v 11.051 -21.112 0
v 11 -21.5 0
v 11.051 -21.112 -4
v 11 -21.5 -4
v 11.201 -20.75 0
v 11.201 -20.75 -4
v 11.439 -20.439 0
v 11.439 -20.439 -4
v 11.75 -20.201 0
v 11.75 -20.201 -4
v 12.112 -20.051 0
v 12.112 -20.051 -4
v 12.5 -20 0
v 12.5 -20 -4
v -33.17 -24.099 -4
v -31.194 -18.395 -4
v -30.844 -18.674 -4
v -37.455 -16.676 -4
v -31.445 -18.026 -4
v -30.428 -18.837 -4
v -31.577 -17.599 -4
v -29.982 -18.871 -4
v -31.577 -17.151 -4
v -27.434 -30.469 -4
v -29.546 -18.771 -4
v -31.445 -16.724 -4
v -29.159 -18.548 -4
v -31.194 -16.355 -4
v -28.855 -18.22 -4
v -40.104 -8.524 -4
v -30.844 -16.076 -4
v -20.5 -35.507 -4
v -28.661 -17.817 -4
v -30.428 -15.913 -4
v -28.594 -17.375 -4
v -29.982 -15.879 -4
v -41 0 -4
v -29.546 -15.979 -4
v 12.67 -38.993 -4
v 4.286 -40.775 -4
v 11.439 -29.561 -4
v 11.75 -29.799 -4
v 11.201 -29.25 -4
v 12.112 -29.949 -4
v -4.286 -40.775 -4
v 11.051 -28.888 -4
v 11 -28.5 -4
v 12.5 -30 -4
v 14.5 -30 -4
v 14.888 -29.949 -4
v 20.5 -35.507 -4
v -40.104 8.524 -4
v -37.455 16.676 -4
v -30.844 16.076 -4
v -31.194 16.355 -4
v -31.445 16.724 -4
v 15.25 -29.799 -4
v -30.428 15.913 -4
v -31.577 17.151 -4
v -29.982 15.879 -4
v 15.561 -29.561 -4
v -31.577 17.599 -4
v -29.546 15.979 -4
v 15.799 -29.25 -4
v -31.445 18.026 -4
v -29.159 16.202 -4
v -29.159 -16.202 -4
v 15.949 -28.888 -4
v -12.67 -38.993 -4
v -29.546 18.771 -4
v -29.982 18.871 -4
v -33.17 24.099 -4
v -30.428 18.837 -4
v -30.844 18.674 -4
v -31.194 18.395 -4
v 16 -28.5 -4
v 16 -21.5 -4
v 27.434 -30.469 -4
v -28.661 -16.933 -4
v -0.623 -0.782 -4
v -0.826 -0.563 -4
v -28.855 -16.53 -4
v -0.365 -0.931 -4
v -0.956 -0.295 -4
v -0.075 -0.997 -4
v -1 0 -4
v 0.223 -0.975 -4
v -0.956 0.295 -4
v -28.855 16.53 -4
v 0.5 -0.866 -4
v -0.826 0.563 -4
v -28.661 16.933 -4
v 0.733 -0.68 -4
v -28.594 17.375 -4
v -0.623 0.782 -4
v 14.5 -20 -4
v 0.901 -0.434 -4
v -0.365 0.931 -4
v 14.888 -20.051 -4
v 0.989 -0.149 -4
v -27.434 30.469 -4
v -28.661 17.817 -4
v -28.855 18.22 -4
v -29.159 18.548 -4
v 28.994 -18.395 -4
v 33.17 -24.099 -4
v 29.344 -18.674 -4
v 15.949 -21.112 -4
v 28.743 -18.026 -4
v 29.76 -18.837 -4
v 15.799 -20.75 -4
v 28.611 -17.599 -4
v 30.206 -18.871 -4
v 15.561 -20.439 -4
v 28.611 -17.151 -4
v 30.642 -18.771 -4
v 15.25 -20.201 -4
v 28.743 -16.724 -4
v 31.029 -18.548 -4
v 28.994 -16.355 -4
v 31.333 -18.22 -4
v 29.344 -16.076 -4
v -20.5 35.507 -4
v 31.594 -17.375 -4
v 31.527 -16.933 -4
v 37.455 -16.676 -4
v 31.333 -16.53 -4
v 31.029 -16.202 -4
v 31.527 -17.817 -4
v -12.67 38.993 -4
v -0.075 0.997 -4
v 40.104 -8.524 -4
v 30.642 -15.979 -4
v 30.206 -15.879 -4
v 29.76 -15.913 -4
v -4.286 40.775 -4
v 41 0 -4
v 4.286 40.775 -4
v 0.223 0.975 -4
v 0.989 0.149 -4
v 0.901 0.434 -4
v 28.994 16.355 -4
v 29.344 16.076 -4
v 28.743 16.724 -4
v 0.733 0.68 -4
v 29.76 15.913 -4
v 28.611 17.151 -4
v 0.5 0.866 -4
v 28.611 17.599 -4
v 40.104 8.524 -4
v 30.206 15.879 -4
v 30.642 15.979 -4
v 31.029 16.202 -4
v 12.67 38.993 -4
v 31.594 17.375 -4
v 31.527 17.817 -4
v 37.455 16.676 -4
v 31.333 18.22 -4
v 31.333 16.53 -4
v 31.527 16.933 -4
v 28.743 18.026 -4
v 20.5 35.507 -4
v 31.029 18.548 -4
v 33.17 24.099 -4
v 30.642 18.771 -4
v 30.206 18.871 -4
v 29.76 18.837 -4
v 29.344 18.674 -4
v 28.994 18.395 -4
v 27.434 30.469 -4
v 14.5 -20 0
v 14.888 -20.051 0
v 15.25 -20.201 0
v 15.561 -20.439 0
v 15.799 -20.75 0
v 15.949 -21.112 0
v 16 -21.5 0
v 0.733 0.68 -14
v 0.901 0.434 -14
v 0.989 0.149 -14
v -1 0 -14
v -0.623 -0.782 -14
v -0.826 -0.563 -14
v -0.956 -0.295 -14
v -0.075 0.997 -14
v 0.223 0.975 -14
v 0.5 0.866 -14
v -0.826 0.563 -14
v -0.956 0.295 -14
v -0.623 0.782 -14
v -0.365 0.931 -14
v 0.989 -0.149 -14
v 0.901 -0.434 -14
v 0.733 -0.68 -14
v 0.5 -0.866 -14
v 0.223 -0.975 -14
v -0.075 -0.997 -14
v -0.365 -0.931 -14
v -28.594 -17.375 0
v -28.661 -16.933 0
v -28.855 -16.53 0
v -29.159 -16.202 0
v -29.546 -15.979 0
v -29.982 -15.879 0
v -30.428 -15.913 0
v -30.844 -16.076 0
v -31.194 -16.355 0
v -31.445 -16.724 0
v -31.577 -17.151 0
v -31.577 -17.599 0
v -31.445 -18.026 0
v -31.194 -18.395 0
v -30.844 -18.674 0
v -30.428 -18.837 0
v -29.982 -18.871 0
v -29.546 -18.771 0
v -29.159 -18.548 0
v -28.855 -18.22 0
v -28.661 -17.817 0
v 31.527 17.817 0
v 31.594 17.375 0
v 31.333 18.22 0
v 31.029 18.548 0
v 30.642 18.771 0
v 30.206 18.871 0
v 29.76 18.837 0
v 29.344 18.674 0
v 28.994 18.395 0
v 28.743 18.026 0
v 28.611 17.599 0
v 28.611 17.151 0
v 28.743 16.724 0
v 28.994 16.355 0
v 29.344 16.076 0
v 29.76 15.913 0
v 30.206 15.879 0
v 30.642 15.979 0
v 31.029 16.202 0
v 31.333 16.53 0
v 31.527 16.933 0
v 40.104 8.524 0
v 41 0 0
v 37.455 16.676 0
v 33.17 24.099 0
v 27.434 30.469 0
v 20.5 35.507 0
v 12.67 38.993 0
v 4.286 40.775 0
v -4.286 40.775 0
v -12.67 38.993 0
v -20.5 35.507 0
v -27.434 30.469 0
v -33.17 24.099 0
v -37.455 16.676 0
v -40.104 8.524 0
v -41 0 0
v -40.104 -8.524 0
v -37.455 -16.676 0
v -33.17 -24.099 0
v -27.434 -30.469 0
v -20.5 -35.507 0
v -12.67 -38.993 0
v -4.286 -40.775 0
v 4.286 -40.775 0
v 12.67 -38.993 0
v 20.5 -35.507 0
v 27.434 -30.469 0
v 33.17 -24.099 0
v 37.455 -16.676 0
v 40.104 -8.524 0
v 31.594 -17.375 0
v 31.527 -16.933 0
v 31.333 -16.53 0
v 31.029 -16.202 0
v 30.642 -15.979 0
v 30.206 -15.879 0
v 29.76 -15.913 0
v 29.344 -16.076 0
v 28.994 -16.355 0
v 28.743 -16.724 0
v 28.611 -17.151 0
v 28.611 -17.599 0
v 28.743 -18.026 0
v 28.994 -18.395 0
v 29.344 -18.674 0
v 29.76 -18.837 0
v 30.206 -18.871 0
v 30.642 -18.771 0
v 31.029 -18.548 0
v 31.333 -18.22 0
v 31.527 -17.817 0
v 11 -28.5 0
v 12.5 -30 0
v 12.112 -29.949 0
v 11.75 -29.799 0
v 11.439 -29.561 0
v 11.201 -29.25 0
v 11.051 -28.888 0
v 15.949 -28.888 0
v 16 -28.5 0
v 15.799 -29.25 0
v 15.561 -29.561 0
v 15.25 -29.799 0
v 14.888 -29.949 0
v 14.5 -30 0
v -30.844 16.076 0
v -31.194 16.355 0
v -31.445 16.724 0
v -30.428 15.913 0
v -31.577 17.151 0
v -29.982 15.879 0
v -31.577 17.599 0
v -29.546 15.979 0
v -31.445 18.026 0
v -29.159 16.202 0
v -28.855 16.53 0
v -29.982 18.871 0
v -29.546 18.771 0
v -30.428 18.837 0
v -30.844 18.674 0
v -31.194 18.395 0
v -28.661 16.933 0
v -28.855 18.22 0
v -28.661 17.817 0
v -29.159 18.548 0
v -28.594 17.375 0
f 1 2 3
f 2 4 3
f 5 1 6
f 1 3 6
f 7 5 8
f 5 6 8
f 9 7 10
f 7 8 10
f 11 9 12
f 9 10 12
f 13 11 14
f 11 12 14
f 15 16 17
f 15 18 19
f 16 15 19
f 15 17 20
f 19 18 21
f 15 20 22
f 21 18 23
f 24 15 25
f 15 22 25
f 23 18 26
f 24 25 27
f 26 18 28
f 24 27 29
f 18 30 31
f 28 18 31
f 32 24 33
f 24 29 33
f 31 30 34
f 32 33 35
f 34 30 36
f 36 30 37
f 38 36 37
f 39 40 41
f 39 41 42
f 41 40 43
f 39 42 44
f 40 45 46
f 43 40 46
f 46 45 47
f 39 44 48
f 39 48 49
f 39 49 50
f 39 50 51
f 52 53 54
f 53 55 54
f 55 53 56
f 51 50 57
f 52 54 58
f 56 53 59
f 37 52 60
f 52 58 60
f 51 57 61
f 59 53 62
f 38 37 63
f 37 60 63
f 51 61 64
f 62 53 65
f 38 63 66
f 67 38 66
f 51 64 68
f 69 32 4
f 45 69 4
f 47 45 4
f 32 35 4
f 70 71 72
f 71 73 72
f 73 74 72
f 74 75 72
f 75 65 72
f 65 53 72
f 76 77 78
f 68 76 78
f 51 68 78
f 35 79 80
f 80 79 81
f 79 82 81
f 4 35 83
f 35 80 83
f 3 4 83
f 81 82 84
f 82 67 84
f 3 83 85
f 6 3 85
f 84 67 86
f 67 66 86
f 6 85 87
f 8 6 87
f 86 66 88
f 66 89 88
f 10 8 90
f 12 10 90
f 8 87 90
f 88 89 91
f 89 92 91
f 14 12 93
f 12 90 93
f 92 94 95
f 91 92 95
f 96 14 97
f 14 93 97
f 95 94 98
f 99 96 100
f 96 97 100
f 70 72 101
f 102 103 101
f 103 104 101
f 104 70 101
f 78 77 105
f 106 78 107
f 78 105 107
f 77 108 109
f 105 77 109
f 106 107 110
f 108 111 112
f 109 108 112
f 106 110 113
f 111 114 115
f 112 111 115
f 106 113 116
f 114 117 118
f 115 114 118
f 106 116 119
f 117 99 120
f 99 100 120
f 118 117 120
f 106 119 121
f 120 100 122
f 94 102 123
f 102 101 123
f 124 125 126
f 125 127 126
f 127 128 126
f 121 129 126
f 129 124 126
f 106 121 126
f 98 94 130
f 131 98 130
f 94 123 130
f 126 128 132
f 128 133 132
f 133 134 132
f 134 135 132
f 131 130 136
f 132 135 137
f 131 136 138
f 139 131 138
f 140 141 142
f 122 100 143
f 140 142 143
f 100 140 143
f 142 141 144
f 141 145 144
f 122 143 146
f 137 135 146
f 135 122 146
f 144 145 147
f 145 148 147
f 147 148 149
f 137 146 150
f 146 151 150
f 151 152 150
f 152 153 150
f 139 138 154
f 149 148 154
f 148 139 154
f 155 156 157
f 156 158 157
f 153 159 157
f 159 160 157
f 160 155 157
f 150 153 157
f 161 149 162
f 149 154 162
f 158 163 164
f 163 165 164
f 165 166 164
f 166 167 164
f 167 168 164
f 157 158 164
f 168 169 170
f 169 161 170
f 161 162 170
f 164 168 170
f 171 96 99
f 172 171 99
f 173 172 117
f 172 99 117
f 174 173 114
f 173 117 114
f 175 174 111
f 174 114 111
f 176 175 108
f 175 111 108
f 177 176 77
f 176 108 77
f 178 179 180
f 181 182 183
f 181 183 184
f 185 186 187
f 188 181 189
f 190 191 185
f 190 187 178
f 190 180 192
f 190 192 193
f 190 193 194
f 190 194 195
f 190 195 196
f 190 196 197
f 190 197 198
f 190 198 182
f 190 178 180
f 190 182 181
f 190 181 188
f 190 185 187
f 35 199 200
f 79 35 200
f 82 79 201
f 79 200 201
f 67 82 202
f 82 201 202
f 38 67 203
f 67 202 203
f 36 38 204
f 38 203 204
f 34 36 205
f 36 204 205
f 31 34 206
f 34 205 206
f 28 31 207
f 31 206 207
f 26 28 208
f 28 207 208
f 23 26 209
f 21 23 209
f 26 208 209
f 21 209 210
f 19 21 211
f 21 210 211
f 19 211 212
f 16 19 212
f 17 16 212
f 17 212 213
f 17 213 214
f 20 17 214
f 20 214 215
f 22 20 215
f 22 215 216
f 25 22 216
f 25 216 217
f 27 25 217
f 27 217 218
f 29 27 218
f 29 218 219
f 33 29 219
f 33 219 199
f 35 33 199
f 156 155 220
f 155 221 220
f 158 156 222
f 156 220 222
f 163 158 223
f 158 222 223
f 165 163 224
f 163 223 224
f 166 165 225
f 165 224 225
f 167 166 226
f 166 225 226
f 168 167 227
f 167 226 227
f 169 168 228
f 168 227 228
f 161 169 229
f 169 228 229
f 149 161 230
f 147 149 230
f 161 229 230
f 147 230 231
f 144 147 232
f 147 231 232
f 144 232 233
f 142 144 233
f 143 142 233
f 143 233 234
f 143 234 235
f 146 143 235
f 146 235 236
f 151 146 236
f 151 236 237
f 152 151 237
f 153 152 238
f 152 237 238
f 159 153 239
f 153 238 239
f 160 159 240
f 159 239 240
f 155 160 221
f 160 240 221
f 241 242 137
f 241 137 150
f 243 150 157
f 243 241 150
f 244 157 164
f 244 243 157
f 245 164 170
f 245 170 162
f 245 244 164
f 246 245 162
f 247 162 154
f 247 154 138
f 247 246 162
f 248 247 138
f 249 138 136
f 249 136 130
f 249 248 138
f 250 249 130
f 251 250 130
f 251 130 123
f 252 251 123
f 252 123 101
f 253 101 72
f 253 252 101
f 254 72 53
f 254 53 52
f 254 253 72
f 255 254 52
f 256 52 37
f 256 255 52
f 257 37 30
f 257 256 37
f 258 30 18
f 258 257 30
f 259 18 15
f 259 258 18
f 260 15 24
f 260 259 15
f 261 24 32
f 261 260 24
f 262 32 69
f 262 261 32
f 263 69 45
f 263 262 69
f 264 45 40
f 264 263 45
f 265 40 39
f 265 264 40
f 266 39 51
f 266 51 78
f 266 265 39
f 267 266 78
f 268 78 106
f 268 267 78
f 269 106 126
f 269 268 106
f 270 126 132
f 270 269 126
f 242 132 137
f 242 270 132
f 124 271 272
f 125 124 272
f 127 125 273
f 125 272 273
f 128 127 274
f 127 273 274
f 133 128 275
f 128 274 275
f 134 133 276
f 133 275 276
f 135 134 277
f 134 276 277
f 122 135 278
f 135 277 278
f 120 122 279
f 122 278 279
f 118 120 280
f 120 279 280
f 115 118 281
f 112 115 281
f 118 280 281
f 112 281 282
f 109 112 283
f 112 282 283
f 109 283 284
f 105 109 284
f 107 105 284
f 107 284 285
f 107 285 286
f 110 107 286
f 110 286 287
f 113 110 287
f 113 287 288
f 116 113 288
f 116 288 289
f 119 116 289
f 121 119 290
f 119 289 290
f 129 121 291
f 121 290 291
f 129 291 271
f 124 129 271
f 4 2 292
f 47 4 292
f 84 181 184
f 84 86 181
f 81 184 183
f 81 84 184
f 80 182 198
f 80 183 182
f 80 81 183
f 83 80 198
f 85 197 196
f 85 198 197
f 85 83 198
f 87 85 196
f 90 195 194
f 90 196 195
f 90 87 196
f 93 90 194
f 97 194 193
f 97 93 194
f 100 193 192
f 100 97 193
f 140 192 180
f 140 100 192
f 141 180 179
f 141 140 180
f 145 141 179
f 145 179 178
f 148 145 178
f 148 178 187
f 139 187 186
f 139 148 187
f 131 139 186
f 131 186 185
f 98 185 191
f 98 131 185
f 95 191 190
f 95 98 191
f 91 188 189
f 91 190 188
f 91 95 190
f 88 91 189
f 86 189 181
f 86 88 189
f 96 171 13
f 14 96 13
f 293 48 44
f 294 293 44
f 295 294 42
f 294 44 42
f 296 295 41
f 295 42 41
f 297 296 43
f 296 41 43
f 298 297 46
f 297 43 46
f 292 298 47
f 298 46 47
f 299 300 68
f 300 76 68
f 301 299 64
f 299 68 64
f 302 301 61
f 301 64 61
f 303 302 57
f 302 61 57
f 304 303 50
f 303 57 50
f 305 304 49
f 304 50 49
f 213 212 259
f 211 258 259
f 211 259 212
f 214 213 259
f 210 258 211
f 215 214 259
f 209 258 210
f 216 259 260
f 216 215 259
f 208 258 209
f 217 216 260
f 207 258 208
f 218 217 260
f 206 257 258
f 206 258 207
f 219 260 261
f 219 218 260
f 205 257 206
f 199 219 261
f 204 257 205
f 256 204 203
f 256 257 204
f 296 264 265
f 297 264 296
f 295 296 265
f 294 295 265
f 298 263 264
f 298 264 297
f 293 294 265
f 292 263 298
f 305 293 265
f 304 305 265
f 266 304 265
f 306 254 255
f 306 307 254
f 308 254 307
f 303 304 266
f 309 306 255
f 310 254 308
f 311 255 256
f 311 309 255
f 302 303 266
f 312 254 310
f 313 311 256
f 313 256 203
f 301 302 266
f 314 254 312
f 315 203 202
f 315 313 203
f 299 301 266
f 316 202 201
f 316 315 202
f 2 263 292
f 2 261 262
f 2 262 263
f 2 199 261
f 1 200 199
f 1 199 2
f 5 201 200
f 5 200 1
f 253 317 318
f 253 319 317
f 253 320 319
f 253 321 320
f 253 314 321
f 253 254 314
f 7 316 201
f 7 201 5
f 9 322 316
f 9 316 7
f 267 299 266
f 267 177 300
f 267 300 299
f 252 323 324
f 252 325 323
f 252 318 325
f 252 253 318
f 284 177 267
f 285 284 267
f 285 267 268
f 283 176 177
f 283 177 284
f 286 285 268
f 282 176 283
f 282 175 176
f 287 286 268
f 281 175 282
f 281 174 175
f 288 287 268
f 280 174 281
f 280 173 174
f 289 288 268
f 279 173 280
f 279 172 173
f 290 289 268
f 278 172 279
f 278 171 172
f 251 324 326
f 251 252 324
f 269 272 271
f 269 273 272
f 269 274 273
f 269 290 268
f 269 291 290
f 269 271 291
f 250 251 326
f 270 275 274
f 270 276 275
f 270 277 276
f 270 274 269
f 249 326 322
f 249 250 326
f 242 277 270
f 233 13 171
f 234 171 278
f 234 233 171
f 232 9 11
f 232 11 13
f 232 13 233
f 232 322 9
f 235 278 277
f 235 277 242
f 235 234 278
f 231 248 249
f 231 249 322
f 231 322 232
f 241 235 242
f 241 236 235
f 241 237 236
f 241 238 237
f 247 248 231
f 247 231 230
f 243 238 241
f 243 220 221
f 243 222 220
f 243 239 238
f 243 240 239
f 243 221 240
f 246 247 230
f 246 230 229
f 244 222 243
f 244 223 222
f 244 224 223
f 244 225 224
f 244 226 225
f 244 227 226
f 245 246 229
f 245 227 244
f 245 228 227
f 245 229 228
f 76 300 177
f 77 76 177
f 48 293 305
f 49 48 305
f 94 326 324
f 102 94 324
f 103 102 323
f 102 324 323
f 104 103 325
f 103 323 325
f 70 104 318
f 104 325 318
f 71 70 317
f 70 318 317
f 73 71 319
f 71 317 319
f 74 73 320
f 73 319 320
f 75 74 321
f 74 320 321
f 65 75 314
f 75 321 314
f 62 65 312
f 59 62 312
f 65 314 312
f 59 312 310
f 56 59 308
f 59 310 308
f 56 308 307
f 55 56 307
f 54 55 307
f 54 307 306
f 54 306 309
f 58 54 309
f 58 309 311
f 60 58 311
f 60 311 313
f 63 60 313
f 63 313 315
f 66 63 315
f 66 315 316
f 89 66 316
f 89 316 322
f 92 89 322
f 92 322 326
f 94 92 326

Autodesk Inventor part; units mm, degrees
ref_plane "YZ Plane" through (0, 0, 0) normal (1, 0, 0) x (0, 1, 0)
sketch "Sketch1" plane through (0, 0, 0) normal (0, 0, 1) x (1, 0, 0)
  circle A0 centre (0, 0) radius 41
  circle A1 centre (0, 0) radius 17.705
  circle A2 centre (0, 0) radius 15
  circle A3 centre (0, 15) radius 0.75
  circle A4 centre (-10.6066, 10.6066) radius 0.75
  circle A5 centre (-15, 0) radius 0.75
  circle A6 centre (-10.6066, -10.6066) radius 0.75
  circle A7 centre (0, -15) radius 0.75
  circle A8 centre (10.6066, -10.6066) radius 0.75
  circle A9 centre (15, 0) radius 0.75
  circle A10 centre (10.6066, 10.6066) radius 0.75
  dimension "d4" = 30
  dimension "d0" = 82
  dimension "d3" = 35.41
  dimension "d5" = 1.5
  dimension "d6" = 360
sketch "Sketch2" plane through (0, 0, 0) normal (0, 0, 1) x (1, 0, 0)
  circle A0 centre (-30.094, -17.375) radius 1.5
  circle A1 centre (-30.094, 17.375) radius 1.5
  circle A2 centre (30.094, 17.375) radius 1.5
  circle A3 centre (30.094, -17.375) radius 1.5
  point P0 (0, 0)
  dimension "d7" = 3
  dimension "d8" = 3
  dimension "d9" = 3
  dimension "d10" = 3
  dimension "d11" = 17.375
  dimension "d12" = 30.094
  dimension "d13" = 30.094
  dimension "d14" = 17.375
  dimension "d15" = 17.375
  dimension "d16" = 30.094
  dimension "d17" = 17.375
  dimension "d18" = 30.094
extrude "Extrusion1" add sketch "Sketch1" against normal blind 4 contours A0 | A1 | A2 A9 | A2 A9 | A9 A2 A8 A7 A6 A5 A4 A3 A10 | A10 A2 | A2 A10 | A8 A2 | A2 A8 | A3 A2 | A2 A3 | A7 A2 | A2 A7 | A4 A2 | A2 A4 | A6 A2 | A2 A6 | A5 A2 | A2 A5
extrude "Extrusion2" cut sketch "Sketch2" against normal blind 4
ref_plane "Work Plane1" through (0, 0, -4) normal (0, 0, 1) x (1, 0, 0)
ref_plane "Work Plane2" through (0, 0, -4) normal (0, 0, 1) x (1, 0, 0)
ref_plane "Work Plane3" through (0, 0, 0) normal (0, 0, 1) x (1, 0, 0)
sketch "Sketch5" plane through (0, 0, 0) normal (0, 0, 1) x (1, 0, 0)
  line L0 (11, -30) -> (16, -30)
  line L1 (16, -30) -> (16, -20)
  line L2 (16, -20) -> (11, -20)
  line L3 (11, -20) -> (11, -30)
  point P0 (0, 0)
  point P1 (13.5, -20)
  point P2 (13.5, -30)
  point P3 (16, -25)
  dimension "d44" = 5
  dimension "d45" = 10
  dimension "d52" = 11
  dimension "d53" = 20
extrude "Extrusion5" cut sketch "Sketch5" against normal blind 4
fillet "Fillet1" radius 1.5 4 edges at (11, -20, -2) (11, -30, -2) (16, -20, -2) (16, -30, -2)
ref_plane "Work Plane6" through (0, 0, -4) normal (0, 0, -1) x (-1, 0, 0)
sketch "Sketch10" plane through (0, 0, -4) normal (0, 0, -1) x (-1, 0, 0)
  circle A0 centre (0, 0) radius 1
  dimension "d71" = 2
extrude "Extrusion10" add sketch "Sketch10" along normal blind 10
properties part number "lower-plate_3DPrint"
